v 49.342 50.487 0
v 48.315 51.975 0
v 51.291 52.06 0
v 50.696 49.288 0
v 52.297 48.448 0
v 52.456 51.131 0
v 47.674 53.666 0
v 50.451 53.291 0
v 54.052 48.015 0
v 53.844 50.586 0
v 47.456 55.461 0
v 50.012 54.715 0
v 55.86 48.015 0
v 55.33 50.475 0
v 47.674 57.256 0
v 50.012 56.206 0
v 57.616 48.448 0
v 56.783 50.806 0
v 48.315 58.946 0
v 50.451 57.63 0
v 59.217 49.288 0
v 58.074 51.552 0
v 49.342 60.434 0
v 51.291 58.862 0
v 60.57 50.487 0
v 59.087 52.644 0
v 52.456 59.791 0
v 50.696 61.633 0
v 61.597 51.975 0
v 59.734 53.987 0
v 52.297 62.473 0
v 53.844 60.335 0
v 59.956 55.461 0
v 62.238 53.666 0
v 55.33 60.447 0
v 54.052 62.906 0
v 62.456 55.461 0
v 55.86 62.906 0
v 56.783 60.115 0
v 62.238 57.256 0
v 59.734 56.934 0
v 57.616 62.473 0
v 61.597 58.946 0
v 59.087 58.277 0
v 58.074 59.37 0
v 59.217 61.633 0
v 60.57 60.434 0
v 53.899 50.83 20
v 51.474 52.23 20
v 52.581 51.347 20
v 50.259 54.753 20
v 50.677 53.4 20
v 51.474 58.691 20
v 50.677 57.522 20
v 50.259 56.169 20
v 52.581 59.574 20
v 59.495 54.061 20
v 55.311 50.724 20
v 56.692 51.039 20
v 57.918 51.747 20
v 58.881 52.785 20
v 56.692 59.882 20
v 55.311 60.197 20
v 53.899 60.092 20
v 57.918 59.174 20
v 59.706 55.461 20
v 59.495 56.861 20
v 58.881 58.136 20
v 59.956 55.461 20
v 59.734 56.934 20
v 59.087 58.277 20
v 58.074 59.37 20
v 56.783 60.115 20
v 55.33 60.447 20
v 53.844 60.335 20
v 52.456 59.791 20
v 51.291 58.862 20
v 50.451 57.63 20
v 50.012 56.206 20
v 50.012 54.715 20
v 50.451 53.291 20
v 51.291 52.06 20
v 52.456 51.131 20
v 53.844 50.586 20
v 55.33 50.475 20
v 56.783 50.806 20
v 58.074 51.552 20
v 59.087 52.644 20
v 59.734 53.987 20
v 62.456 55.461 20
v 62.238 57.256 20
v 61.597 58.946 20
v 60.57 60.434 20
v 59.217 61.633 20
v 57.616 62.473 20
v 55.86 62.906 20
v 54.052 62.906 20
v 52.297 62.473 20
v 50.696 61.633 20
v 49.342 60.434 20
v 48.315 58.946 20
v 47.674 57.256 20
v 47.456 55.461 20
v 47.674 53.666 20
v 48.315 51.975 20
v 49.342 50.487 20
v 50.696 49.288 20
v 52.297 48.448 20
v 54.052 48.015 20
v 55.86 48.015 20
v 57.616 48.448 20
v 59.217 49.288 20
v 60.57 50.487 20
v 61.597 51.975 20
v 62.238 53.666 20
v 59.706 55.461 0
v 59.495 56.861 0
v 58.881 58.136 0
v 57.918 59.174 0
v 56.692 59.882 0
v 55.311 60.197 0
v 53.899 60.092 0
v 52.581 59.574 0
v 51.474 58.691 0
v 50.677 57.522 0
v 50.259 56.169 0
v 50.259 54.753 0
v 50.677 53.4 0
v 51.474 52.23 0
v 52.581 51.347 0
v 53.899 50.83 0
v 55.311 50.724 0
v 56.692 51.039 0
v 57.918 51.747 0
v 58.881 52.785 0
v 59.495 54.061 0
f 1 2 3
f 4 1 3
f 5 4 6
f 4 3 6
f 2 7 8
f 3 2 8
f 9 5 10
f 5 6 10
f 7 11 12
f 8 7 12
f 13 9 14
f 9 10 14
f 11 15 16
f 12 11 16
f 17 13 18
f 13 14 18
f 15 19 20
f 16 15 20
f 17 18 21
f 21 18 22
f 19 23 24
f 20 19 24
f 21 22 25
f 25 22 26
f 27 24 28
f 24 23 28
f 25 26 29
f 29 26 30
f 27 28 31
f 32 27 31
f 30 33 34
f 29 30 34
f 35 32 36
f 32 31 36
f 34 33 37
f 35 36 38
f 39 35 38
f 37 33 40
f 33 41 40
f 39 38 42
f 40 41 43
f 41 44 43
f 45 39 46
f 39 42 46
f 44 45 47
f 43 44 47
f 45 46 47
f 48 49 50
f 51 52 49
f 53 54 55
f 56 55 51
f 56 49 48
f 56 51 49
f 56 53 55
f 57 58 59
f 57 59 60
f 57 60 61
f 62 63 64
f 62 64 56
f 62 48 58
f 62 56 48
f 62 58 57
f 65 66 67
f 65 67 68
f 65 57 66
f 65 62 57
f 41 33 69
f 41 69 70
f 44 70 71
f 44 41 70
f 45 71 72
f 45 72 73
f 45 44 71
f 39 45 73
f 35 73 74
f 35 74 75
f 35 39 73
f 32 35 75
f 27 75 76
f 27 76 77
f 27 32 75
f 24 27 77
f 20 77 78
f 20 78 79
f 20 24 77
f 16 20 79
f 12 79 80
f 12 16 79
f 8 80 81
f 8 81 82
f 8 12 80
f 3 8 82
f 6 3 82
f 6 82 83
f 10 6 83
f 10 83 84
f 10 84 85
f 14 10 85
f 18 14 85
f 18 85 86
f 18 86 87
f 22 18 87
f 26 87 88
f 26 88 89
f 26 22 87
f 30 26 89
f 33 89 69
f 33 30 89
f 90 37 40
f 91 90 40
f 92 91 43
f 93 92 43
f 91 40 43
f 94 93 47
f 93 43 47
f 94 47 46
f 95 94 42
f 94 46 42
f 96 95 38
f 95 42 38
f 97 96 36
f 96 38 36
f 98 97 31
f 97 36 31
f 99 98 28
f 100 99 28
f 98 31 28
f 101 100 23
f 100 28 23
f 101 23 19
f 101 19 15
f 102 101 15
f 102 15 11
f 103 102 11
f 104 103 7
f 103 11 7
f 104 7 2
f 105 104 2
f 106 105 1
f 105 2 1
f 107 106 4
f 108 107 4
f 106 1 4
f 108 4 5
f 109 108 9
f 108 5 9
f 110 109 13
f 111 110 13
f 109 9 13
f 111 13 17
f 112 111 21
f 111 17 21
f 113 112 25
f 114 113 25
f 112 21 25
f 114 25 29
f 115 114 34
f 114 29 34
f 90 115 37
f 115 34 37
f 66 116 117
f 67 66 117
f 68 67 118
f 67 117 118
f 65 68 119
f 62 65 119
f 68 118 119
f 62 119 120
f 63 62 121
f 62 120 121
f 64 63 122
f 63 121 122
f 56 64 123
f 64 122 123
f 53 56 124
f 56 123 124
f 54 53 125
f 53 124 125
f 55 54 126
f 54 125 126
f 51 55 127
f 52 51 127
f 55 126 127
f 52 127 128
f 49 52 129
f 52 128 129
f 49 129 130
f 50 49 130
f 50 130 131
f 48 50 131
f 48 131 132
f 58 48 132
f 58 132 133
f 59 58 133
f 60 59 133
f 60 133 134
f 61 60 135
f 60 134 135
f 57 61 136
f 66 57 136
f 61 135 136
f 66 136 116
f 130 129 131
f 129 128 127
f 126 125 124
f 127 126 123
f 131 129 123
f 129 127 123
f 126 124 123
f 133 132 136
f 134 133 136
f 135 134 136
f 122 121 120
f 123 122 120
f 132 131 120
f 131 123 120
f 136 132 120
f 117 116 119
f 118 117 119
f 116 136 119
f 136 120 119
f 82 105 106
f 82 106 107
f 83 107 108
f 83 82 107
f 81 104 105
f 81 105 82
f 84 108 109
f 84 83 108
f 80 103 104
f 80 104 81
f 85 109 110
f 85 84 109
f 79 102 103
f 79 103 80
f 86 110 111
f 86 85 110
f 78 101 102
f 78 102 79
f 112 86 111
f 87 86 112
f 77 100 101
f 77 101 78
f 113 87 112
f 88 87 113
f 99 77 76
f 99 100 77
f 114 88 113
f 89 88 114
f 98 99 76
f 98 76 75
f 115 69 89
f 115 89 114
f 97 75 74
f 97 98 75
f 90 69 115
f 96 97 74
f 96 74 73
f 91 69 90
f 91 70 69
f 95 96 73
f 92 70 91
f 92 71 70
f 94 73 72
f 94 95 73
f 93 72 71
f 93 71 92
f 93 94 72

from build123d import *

# Parameters (mm, degrees)
F0_R     = 7.5
F0_R_2   = 5
F1_DEPTH = 20
F2_R     = 4.75
F3_DEPTH = 20


# Not quite as in the source:
# - a feature names something its author has since deleted; it is built from what else it names


with BuildPart() as f1:
    # F0 (on Top) → F1 (new body)
    with BuildSketch(Plane.XY):
        with Locations((54.9561347067, 55.4606581624)):
            Circle(F0_R)
        with Locations((54.9561347067, 55.4606581624)):
            Circle(F0_R_2, mode=Mode.SUBTRACT)
    extrude(amount=F1_DEPTH)


with BuildPart() as f3:
    # F2 (on Top) → F3 (new body)
    with BuildSketch(Plane.XY):
        with Locations((54.9561347067, 55.4606581624)):
            Circle(F2_R)
    extrude(amount=F3_DEPTH)


solid = Compound([f1.part, f3.part])
